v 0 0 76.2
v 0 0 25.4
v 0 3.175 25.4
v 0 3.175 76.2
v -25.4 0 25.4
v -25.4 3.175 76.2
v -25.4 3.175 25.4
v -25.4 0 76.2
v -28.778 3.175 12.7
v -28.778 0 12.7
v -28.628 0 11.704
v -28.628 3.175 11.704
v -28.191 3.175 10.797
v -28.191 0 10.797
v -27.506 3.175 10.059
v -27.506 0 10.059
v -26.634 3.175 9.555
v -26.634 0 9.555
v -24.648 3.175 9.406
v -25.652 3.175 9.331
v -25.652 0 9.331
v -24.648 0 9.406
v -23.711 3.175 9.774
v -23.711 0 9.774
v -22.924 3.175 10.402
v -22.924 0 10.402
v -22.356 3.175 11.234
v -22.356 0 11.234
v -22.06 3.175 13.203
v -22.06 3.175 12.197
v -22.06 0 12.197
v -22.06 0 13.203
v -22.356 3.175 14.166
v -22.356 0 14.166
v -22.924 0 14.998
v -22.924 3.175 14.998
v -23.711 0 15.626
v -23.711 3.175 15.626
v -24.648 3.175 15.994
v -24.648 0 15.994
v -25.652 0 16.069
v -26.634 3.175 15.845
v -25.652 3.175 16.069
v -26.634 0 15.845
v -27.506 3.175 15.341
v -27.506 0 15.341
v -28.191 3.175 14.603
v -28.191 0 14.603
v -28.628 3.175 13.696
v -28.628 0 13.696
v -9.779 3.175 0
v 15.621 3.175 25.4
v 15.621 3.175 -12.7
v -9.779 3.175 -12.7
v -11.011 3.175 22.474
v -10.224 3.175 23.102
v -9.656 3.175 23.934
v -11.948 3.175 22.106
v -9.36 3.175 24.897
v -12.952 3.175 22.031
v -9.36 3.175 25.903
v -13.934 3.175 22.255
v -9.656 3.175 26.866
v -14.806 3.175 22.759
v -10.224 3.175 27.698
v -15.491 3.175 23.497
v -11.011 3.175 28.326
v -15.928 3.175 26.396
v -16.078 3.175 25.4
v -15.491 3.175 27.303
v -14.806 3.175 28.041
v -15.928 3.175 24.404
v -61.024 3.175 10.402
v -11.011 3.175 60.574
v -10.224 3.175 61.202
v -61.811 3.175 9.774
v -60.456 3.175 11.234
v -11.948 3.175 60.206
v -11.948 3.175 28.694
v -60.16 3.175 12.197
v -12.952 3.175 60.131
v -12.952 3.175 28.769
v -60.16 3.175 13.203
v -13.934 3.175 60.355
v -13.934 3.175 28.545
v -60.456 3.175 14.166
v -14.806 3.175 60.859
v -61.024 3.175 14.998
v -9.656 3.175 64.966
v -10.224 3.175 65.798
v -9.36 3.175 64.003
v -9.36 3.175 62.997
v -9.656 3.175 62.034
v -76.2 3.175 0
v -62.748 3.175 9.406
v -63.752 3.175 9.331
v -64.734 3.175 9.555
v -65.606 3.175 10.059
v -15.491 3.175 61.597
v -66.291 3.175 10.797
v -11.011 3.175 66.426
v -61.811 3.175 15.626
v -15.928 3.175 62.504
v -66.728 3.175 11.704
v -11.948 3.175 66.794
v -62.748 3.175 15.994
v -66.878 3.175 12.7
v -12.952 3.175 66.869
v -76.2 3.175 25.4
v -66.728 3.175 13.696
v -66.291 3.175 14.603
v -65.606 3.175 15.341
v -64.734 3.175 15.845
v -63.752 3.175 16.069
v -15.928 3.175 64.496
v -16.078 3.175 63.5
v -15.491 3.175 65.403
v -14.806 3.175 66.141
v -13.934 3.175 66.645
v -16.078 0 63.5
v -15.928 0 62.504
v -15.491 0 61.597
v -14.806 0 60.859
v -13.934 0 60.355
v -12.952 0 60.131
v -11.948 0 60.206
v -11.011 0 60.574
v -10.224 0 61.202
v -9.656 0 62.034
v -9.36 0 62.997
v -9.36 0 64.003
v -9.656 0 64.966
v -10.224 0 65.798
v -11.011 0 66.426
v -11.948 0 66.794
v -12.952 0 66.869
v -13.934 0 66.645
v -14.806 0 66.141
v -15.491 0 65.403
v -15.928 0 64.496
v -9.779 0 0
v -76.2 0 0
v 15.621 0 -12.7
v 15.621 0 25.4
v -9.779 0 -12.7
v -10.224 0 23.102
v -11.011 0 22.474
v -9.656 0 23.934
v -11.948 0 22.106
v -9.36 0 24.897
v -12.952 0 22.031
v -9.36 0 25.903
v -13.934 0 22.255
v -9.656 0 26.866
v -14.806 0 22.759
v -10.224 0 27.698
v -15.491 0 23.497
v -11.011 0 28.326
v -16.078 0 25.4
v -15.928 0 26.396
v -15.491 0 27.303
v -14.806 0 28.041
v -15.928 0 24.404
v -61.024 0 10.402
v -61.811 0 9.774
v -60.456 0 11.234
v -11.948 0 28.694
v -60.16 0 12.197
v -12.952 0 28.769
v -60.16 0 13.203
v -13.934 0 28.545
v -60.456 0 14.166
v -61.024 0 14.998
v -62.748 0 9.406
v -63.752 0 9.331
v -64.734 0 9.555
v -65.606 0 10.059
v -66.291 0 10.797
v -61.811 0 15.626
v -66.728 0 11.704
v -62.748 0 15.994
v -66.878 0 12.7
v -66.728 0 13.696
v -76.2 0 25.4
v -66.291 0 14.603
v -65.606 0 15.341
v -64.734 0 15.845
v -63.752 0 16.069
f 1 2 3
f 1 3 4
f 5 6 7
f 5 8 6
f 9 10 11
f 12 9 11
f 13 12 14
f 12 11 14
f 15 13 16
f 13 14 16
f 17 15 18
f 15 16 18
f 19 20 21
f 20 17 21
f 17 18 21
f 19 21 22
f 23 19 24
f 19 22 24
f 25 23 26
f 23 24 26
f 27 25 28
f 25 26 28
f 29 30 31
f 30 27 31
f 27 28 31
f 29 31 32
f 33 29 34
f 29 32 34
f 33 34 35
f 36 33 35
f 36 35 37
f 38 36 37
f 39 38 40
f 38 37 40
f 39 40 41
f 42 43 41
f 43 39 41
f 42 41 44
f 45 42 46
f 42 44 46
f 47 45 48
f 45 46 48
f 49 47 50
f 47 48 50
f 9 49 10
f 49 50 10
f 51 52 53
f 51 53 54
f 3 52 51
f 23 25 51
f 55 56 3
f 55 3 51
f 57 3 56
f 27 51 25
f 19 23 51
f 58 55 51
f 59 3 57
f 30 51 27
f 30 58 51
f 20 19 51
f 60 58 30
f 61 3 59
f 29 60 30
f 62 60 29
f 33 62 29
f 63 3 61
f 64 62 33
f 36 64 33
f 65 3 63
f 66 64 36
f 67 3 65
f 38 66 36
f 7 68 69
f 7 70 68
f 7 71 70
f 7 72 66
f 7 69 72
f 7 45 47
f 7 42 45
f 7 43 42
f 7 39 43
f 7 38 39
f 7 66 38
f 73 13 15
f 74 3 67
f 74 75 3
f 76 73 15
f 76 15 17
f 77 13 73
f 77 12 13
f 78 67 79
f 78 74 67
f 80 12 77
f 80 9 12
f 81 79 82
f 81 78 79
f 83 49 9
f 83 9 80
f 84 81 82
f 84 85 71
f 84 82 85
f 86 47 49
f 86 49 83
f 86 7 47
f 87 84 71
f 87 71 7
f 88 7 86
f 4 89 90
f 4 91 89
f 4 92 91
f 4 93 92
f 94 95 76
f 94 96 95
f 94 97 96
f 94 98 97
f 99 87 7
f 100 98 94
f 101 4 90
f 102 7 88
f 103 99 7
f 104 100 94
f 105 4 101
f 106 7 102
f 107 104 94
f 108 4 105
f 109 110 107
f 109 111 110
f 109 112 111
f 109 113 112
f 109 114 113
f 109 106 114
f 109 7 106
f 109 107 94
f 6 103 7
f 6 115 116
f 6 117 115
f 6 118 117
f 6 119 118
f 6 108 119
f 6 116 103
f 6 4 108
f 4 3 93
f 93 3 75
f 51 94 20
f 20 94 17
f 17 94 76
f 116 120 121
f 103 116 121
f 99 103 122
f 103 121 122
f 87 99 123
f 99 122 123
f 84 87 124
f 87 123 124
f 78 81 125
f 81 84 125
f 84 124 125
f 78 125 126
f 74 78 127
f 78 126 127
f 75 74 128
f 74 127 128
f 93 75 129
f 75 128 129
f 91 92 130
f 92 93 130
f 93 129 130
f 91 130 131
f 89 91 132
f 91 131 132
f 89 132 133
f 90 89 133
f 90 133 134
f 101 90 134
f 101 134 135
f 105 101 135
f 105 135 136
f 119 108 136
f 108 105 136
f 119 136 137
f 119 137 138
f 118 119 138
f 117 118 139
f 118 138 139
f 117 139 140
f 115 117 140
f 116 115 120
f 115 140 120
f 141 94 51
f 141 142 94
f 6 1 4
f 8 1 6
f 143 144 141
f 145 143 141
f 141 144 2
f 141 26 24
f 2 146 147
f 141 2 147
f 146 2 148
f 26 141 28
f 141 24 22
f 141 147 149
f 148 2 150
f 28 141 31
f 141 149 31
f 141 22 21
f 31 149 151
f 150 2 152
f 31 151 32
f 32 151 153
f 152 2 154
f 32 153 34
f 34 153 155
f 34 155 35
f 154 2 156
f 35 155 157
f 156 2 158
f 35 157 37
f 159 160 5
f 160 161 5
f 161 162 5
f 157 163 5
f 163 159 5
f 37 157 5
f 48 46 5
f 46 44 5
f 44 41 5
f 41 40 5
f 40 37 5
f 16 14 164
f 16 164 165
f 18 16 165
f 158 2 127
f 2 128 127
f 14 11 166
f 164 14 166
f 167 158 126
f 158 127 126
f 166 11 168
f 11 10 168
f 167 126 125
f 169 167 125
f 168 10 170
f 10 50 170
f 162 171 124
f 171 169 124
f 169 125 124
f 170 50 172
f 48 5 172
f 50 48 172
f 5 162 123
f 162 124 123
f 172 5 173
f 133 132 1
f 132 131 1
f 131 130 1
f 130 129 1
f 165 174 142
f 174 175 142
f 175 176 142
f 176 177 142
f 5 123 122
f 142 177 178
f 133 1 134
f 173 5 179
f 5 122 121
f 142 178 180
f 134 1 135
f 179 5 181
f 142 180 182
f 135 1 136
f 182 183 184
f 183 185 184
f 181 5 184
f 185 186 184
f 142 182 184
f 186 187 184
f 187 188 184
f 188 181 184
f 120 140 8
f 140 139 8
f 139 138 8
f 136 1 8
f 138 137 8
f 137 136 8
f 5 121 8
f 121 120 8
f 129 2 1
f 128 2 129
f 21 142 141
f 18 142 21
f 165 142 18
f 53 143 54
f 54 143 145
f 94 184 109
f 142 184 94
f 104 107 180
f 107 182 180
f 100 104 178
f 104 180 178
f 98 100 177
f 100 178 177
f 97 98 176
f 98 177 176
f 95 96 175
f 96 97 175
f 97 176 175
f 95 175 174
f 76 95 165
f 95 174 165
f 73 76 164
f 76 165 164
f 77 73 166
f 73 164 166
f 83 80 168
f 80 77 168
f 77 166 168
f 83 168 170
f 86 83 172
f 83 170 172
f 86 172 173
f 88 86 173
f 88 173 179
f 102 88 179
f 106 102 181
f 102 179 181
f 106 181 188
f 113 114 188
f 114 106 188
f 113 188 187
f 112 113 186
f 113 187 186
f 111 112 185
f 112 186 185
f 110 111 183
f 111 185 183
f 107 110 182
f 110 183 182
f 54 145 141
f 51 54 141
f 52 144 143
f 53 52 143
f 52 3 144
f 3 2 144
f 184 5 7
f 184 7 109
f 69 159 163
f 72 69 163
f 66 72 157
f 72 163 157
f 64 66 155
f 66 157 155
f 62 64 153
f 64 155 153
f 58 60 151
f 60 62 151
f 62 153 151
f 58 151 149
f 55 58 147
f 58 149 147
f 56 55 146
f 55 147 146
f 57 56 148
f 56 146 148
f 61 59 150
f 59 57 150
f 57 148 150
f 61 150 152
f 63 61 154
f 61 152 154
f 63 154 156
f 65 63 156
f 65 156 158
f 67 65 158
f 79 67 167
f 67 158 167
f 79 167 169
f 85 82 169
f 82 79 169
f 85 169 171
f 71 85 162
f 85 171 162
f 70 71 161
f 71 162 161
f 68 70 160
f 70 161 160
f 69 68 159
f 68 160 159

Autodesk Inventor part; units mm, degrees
ref_plane "YZ Plane" through (0, 0, 0) normal (1, 0, 0) x (0, 1, 0)
ref_plane "XZ Plane" through (0, 0, 0) normal (0, 1, 0) x (-1, 0, 0)
ref_plane "XY Plane" through (0, 0, 0) normal (0, 0, 1) x (1, 0, 0)
sketch "Sketch1" plane through (0, 0, 0) normal (0, 1, 0) x (-1, 0, 0)
  line L0 (0, 0) -> (0, 76.2)
  line L1 (0, 76.2) -> (25.4, 76.2)
  line L2 (25.4, 76.2) -> (25.4, 25.4)
  line L3 (25.4, 25.4) -> (76.2, 25.4)
  line L4 (76.2, 25.4) -> (76.2, 0)
  line L5 (76.2, 0) -> (0, 0)
  line L6 (25.4, 25.4) -> (0, 0) construction
  circle A0 centre (12.7, 63.5) radius 3.3782
  circle A1 centre (12.7, 25.4) radius 3.3782
  circle A2 centre (25.4, 12.7) radius 3.3782
  circle A3 centre (63.5, 12.7) radius 3.3782
  dimension "d0" = 76.2
  dimension "d1" = 25.4
  dimension "d2" = 50.8
  dimension "d3" = 50.8
  dimension "d4" = 25.4
  dimension "d5" = 6.7564
  dimension "d6" = 6.7564
  dimension "d7" = 6.7564
  dimension "d8" = 6.7564
  dimension "d9" = 12.7
  dimension "d10" = 0
  dimension "d11" = 12.7
  dimension "d12" = 12.7
  dimension "d13" = 12.7
  dimension "d14" = 12.7
  dimension "d15" = 12.7
extrude "Extrusion1" add sketch "Sketch1" along normal blind 3.175
sketch "Sketch2" plane through (0, 0, 0) normal (0, -1, 0) x (1, 0, 0)
  line L0 (0, 76.2) -> (0, 0) projected
  line L1 (0, 0) -> (-76.2, 0) projected
  line L2 (0, 25.4) -> (15.621, 25.4)
  line L3 (15.621, 25.4) -> (15.621, -12.7)
  line L4 (15.621, -12.7) -> (-9.779, -12.7)
  line L5 (-9.779, -12.7) -> (-9.779, 0)
  dimension "d19" = 15.621
  dimension "d20" = 38.1
  dimension "d21" = 25.4
extrude "Extrusion2" add sketch "Sketch2" against normal blind 3.175
sketch "Sketch3" plane through (0, 0, 0) normal (0, -1, 0) x (1, 0, 0)
  circle A0 centre (-63.5, 12.7) radius 3.3782 projected
  circle A1 centre (-25.4, 12.7) radius 3.3782 projected
  circle A2 centre (-12.7, 25.4) radius 3.3782 projected
  circle A3 centre (-12.7, 63.5) radius 3.3782 projected
  line L0 (0, 76.2) -> (0, 25.4) projected
  line L1 (-25.4, 76.2) -> (0, 76.2) projected
  line L2 (-25.4, 25.4) -> (-25.4, 76.2) projected
  line L3 (-76.2, 25.4) -> (-25.4, 25.4) projected
  line L4 (-76.2, 0) -> (-76.2, 25.4) projected
  line L5 (-9.779, 0) -> (-76.2, 0) projected
  line L6 (-9.779, 0) -> (-9.779, -12.7) projected
  line L7 (-9.779, -12.7) -> (15.621, -12.7) projected
  line L8 (15.621, -12.7) -> (15.621, 25.4) projected
  line L9 (15.621, 25.4) -> (0, 25.4) projected
  point P0 (0, 0)
properties part number "Gusset Connector"
